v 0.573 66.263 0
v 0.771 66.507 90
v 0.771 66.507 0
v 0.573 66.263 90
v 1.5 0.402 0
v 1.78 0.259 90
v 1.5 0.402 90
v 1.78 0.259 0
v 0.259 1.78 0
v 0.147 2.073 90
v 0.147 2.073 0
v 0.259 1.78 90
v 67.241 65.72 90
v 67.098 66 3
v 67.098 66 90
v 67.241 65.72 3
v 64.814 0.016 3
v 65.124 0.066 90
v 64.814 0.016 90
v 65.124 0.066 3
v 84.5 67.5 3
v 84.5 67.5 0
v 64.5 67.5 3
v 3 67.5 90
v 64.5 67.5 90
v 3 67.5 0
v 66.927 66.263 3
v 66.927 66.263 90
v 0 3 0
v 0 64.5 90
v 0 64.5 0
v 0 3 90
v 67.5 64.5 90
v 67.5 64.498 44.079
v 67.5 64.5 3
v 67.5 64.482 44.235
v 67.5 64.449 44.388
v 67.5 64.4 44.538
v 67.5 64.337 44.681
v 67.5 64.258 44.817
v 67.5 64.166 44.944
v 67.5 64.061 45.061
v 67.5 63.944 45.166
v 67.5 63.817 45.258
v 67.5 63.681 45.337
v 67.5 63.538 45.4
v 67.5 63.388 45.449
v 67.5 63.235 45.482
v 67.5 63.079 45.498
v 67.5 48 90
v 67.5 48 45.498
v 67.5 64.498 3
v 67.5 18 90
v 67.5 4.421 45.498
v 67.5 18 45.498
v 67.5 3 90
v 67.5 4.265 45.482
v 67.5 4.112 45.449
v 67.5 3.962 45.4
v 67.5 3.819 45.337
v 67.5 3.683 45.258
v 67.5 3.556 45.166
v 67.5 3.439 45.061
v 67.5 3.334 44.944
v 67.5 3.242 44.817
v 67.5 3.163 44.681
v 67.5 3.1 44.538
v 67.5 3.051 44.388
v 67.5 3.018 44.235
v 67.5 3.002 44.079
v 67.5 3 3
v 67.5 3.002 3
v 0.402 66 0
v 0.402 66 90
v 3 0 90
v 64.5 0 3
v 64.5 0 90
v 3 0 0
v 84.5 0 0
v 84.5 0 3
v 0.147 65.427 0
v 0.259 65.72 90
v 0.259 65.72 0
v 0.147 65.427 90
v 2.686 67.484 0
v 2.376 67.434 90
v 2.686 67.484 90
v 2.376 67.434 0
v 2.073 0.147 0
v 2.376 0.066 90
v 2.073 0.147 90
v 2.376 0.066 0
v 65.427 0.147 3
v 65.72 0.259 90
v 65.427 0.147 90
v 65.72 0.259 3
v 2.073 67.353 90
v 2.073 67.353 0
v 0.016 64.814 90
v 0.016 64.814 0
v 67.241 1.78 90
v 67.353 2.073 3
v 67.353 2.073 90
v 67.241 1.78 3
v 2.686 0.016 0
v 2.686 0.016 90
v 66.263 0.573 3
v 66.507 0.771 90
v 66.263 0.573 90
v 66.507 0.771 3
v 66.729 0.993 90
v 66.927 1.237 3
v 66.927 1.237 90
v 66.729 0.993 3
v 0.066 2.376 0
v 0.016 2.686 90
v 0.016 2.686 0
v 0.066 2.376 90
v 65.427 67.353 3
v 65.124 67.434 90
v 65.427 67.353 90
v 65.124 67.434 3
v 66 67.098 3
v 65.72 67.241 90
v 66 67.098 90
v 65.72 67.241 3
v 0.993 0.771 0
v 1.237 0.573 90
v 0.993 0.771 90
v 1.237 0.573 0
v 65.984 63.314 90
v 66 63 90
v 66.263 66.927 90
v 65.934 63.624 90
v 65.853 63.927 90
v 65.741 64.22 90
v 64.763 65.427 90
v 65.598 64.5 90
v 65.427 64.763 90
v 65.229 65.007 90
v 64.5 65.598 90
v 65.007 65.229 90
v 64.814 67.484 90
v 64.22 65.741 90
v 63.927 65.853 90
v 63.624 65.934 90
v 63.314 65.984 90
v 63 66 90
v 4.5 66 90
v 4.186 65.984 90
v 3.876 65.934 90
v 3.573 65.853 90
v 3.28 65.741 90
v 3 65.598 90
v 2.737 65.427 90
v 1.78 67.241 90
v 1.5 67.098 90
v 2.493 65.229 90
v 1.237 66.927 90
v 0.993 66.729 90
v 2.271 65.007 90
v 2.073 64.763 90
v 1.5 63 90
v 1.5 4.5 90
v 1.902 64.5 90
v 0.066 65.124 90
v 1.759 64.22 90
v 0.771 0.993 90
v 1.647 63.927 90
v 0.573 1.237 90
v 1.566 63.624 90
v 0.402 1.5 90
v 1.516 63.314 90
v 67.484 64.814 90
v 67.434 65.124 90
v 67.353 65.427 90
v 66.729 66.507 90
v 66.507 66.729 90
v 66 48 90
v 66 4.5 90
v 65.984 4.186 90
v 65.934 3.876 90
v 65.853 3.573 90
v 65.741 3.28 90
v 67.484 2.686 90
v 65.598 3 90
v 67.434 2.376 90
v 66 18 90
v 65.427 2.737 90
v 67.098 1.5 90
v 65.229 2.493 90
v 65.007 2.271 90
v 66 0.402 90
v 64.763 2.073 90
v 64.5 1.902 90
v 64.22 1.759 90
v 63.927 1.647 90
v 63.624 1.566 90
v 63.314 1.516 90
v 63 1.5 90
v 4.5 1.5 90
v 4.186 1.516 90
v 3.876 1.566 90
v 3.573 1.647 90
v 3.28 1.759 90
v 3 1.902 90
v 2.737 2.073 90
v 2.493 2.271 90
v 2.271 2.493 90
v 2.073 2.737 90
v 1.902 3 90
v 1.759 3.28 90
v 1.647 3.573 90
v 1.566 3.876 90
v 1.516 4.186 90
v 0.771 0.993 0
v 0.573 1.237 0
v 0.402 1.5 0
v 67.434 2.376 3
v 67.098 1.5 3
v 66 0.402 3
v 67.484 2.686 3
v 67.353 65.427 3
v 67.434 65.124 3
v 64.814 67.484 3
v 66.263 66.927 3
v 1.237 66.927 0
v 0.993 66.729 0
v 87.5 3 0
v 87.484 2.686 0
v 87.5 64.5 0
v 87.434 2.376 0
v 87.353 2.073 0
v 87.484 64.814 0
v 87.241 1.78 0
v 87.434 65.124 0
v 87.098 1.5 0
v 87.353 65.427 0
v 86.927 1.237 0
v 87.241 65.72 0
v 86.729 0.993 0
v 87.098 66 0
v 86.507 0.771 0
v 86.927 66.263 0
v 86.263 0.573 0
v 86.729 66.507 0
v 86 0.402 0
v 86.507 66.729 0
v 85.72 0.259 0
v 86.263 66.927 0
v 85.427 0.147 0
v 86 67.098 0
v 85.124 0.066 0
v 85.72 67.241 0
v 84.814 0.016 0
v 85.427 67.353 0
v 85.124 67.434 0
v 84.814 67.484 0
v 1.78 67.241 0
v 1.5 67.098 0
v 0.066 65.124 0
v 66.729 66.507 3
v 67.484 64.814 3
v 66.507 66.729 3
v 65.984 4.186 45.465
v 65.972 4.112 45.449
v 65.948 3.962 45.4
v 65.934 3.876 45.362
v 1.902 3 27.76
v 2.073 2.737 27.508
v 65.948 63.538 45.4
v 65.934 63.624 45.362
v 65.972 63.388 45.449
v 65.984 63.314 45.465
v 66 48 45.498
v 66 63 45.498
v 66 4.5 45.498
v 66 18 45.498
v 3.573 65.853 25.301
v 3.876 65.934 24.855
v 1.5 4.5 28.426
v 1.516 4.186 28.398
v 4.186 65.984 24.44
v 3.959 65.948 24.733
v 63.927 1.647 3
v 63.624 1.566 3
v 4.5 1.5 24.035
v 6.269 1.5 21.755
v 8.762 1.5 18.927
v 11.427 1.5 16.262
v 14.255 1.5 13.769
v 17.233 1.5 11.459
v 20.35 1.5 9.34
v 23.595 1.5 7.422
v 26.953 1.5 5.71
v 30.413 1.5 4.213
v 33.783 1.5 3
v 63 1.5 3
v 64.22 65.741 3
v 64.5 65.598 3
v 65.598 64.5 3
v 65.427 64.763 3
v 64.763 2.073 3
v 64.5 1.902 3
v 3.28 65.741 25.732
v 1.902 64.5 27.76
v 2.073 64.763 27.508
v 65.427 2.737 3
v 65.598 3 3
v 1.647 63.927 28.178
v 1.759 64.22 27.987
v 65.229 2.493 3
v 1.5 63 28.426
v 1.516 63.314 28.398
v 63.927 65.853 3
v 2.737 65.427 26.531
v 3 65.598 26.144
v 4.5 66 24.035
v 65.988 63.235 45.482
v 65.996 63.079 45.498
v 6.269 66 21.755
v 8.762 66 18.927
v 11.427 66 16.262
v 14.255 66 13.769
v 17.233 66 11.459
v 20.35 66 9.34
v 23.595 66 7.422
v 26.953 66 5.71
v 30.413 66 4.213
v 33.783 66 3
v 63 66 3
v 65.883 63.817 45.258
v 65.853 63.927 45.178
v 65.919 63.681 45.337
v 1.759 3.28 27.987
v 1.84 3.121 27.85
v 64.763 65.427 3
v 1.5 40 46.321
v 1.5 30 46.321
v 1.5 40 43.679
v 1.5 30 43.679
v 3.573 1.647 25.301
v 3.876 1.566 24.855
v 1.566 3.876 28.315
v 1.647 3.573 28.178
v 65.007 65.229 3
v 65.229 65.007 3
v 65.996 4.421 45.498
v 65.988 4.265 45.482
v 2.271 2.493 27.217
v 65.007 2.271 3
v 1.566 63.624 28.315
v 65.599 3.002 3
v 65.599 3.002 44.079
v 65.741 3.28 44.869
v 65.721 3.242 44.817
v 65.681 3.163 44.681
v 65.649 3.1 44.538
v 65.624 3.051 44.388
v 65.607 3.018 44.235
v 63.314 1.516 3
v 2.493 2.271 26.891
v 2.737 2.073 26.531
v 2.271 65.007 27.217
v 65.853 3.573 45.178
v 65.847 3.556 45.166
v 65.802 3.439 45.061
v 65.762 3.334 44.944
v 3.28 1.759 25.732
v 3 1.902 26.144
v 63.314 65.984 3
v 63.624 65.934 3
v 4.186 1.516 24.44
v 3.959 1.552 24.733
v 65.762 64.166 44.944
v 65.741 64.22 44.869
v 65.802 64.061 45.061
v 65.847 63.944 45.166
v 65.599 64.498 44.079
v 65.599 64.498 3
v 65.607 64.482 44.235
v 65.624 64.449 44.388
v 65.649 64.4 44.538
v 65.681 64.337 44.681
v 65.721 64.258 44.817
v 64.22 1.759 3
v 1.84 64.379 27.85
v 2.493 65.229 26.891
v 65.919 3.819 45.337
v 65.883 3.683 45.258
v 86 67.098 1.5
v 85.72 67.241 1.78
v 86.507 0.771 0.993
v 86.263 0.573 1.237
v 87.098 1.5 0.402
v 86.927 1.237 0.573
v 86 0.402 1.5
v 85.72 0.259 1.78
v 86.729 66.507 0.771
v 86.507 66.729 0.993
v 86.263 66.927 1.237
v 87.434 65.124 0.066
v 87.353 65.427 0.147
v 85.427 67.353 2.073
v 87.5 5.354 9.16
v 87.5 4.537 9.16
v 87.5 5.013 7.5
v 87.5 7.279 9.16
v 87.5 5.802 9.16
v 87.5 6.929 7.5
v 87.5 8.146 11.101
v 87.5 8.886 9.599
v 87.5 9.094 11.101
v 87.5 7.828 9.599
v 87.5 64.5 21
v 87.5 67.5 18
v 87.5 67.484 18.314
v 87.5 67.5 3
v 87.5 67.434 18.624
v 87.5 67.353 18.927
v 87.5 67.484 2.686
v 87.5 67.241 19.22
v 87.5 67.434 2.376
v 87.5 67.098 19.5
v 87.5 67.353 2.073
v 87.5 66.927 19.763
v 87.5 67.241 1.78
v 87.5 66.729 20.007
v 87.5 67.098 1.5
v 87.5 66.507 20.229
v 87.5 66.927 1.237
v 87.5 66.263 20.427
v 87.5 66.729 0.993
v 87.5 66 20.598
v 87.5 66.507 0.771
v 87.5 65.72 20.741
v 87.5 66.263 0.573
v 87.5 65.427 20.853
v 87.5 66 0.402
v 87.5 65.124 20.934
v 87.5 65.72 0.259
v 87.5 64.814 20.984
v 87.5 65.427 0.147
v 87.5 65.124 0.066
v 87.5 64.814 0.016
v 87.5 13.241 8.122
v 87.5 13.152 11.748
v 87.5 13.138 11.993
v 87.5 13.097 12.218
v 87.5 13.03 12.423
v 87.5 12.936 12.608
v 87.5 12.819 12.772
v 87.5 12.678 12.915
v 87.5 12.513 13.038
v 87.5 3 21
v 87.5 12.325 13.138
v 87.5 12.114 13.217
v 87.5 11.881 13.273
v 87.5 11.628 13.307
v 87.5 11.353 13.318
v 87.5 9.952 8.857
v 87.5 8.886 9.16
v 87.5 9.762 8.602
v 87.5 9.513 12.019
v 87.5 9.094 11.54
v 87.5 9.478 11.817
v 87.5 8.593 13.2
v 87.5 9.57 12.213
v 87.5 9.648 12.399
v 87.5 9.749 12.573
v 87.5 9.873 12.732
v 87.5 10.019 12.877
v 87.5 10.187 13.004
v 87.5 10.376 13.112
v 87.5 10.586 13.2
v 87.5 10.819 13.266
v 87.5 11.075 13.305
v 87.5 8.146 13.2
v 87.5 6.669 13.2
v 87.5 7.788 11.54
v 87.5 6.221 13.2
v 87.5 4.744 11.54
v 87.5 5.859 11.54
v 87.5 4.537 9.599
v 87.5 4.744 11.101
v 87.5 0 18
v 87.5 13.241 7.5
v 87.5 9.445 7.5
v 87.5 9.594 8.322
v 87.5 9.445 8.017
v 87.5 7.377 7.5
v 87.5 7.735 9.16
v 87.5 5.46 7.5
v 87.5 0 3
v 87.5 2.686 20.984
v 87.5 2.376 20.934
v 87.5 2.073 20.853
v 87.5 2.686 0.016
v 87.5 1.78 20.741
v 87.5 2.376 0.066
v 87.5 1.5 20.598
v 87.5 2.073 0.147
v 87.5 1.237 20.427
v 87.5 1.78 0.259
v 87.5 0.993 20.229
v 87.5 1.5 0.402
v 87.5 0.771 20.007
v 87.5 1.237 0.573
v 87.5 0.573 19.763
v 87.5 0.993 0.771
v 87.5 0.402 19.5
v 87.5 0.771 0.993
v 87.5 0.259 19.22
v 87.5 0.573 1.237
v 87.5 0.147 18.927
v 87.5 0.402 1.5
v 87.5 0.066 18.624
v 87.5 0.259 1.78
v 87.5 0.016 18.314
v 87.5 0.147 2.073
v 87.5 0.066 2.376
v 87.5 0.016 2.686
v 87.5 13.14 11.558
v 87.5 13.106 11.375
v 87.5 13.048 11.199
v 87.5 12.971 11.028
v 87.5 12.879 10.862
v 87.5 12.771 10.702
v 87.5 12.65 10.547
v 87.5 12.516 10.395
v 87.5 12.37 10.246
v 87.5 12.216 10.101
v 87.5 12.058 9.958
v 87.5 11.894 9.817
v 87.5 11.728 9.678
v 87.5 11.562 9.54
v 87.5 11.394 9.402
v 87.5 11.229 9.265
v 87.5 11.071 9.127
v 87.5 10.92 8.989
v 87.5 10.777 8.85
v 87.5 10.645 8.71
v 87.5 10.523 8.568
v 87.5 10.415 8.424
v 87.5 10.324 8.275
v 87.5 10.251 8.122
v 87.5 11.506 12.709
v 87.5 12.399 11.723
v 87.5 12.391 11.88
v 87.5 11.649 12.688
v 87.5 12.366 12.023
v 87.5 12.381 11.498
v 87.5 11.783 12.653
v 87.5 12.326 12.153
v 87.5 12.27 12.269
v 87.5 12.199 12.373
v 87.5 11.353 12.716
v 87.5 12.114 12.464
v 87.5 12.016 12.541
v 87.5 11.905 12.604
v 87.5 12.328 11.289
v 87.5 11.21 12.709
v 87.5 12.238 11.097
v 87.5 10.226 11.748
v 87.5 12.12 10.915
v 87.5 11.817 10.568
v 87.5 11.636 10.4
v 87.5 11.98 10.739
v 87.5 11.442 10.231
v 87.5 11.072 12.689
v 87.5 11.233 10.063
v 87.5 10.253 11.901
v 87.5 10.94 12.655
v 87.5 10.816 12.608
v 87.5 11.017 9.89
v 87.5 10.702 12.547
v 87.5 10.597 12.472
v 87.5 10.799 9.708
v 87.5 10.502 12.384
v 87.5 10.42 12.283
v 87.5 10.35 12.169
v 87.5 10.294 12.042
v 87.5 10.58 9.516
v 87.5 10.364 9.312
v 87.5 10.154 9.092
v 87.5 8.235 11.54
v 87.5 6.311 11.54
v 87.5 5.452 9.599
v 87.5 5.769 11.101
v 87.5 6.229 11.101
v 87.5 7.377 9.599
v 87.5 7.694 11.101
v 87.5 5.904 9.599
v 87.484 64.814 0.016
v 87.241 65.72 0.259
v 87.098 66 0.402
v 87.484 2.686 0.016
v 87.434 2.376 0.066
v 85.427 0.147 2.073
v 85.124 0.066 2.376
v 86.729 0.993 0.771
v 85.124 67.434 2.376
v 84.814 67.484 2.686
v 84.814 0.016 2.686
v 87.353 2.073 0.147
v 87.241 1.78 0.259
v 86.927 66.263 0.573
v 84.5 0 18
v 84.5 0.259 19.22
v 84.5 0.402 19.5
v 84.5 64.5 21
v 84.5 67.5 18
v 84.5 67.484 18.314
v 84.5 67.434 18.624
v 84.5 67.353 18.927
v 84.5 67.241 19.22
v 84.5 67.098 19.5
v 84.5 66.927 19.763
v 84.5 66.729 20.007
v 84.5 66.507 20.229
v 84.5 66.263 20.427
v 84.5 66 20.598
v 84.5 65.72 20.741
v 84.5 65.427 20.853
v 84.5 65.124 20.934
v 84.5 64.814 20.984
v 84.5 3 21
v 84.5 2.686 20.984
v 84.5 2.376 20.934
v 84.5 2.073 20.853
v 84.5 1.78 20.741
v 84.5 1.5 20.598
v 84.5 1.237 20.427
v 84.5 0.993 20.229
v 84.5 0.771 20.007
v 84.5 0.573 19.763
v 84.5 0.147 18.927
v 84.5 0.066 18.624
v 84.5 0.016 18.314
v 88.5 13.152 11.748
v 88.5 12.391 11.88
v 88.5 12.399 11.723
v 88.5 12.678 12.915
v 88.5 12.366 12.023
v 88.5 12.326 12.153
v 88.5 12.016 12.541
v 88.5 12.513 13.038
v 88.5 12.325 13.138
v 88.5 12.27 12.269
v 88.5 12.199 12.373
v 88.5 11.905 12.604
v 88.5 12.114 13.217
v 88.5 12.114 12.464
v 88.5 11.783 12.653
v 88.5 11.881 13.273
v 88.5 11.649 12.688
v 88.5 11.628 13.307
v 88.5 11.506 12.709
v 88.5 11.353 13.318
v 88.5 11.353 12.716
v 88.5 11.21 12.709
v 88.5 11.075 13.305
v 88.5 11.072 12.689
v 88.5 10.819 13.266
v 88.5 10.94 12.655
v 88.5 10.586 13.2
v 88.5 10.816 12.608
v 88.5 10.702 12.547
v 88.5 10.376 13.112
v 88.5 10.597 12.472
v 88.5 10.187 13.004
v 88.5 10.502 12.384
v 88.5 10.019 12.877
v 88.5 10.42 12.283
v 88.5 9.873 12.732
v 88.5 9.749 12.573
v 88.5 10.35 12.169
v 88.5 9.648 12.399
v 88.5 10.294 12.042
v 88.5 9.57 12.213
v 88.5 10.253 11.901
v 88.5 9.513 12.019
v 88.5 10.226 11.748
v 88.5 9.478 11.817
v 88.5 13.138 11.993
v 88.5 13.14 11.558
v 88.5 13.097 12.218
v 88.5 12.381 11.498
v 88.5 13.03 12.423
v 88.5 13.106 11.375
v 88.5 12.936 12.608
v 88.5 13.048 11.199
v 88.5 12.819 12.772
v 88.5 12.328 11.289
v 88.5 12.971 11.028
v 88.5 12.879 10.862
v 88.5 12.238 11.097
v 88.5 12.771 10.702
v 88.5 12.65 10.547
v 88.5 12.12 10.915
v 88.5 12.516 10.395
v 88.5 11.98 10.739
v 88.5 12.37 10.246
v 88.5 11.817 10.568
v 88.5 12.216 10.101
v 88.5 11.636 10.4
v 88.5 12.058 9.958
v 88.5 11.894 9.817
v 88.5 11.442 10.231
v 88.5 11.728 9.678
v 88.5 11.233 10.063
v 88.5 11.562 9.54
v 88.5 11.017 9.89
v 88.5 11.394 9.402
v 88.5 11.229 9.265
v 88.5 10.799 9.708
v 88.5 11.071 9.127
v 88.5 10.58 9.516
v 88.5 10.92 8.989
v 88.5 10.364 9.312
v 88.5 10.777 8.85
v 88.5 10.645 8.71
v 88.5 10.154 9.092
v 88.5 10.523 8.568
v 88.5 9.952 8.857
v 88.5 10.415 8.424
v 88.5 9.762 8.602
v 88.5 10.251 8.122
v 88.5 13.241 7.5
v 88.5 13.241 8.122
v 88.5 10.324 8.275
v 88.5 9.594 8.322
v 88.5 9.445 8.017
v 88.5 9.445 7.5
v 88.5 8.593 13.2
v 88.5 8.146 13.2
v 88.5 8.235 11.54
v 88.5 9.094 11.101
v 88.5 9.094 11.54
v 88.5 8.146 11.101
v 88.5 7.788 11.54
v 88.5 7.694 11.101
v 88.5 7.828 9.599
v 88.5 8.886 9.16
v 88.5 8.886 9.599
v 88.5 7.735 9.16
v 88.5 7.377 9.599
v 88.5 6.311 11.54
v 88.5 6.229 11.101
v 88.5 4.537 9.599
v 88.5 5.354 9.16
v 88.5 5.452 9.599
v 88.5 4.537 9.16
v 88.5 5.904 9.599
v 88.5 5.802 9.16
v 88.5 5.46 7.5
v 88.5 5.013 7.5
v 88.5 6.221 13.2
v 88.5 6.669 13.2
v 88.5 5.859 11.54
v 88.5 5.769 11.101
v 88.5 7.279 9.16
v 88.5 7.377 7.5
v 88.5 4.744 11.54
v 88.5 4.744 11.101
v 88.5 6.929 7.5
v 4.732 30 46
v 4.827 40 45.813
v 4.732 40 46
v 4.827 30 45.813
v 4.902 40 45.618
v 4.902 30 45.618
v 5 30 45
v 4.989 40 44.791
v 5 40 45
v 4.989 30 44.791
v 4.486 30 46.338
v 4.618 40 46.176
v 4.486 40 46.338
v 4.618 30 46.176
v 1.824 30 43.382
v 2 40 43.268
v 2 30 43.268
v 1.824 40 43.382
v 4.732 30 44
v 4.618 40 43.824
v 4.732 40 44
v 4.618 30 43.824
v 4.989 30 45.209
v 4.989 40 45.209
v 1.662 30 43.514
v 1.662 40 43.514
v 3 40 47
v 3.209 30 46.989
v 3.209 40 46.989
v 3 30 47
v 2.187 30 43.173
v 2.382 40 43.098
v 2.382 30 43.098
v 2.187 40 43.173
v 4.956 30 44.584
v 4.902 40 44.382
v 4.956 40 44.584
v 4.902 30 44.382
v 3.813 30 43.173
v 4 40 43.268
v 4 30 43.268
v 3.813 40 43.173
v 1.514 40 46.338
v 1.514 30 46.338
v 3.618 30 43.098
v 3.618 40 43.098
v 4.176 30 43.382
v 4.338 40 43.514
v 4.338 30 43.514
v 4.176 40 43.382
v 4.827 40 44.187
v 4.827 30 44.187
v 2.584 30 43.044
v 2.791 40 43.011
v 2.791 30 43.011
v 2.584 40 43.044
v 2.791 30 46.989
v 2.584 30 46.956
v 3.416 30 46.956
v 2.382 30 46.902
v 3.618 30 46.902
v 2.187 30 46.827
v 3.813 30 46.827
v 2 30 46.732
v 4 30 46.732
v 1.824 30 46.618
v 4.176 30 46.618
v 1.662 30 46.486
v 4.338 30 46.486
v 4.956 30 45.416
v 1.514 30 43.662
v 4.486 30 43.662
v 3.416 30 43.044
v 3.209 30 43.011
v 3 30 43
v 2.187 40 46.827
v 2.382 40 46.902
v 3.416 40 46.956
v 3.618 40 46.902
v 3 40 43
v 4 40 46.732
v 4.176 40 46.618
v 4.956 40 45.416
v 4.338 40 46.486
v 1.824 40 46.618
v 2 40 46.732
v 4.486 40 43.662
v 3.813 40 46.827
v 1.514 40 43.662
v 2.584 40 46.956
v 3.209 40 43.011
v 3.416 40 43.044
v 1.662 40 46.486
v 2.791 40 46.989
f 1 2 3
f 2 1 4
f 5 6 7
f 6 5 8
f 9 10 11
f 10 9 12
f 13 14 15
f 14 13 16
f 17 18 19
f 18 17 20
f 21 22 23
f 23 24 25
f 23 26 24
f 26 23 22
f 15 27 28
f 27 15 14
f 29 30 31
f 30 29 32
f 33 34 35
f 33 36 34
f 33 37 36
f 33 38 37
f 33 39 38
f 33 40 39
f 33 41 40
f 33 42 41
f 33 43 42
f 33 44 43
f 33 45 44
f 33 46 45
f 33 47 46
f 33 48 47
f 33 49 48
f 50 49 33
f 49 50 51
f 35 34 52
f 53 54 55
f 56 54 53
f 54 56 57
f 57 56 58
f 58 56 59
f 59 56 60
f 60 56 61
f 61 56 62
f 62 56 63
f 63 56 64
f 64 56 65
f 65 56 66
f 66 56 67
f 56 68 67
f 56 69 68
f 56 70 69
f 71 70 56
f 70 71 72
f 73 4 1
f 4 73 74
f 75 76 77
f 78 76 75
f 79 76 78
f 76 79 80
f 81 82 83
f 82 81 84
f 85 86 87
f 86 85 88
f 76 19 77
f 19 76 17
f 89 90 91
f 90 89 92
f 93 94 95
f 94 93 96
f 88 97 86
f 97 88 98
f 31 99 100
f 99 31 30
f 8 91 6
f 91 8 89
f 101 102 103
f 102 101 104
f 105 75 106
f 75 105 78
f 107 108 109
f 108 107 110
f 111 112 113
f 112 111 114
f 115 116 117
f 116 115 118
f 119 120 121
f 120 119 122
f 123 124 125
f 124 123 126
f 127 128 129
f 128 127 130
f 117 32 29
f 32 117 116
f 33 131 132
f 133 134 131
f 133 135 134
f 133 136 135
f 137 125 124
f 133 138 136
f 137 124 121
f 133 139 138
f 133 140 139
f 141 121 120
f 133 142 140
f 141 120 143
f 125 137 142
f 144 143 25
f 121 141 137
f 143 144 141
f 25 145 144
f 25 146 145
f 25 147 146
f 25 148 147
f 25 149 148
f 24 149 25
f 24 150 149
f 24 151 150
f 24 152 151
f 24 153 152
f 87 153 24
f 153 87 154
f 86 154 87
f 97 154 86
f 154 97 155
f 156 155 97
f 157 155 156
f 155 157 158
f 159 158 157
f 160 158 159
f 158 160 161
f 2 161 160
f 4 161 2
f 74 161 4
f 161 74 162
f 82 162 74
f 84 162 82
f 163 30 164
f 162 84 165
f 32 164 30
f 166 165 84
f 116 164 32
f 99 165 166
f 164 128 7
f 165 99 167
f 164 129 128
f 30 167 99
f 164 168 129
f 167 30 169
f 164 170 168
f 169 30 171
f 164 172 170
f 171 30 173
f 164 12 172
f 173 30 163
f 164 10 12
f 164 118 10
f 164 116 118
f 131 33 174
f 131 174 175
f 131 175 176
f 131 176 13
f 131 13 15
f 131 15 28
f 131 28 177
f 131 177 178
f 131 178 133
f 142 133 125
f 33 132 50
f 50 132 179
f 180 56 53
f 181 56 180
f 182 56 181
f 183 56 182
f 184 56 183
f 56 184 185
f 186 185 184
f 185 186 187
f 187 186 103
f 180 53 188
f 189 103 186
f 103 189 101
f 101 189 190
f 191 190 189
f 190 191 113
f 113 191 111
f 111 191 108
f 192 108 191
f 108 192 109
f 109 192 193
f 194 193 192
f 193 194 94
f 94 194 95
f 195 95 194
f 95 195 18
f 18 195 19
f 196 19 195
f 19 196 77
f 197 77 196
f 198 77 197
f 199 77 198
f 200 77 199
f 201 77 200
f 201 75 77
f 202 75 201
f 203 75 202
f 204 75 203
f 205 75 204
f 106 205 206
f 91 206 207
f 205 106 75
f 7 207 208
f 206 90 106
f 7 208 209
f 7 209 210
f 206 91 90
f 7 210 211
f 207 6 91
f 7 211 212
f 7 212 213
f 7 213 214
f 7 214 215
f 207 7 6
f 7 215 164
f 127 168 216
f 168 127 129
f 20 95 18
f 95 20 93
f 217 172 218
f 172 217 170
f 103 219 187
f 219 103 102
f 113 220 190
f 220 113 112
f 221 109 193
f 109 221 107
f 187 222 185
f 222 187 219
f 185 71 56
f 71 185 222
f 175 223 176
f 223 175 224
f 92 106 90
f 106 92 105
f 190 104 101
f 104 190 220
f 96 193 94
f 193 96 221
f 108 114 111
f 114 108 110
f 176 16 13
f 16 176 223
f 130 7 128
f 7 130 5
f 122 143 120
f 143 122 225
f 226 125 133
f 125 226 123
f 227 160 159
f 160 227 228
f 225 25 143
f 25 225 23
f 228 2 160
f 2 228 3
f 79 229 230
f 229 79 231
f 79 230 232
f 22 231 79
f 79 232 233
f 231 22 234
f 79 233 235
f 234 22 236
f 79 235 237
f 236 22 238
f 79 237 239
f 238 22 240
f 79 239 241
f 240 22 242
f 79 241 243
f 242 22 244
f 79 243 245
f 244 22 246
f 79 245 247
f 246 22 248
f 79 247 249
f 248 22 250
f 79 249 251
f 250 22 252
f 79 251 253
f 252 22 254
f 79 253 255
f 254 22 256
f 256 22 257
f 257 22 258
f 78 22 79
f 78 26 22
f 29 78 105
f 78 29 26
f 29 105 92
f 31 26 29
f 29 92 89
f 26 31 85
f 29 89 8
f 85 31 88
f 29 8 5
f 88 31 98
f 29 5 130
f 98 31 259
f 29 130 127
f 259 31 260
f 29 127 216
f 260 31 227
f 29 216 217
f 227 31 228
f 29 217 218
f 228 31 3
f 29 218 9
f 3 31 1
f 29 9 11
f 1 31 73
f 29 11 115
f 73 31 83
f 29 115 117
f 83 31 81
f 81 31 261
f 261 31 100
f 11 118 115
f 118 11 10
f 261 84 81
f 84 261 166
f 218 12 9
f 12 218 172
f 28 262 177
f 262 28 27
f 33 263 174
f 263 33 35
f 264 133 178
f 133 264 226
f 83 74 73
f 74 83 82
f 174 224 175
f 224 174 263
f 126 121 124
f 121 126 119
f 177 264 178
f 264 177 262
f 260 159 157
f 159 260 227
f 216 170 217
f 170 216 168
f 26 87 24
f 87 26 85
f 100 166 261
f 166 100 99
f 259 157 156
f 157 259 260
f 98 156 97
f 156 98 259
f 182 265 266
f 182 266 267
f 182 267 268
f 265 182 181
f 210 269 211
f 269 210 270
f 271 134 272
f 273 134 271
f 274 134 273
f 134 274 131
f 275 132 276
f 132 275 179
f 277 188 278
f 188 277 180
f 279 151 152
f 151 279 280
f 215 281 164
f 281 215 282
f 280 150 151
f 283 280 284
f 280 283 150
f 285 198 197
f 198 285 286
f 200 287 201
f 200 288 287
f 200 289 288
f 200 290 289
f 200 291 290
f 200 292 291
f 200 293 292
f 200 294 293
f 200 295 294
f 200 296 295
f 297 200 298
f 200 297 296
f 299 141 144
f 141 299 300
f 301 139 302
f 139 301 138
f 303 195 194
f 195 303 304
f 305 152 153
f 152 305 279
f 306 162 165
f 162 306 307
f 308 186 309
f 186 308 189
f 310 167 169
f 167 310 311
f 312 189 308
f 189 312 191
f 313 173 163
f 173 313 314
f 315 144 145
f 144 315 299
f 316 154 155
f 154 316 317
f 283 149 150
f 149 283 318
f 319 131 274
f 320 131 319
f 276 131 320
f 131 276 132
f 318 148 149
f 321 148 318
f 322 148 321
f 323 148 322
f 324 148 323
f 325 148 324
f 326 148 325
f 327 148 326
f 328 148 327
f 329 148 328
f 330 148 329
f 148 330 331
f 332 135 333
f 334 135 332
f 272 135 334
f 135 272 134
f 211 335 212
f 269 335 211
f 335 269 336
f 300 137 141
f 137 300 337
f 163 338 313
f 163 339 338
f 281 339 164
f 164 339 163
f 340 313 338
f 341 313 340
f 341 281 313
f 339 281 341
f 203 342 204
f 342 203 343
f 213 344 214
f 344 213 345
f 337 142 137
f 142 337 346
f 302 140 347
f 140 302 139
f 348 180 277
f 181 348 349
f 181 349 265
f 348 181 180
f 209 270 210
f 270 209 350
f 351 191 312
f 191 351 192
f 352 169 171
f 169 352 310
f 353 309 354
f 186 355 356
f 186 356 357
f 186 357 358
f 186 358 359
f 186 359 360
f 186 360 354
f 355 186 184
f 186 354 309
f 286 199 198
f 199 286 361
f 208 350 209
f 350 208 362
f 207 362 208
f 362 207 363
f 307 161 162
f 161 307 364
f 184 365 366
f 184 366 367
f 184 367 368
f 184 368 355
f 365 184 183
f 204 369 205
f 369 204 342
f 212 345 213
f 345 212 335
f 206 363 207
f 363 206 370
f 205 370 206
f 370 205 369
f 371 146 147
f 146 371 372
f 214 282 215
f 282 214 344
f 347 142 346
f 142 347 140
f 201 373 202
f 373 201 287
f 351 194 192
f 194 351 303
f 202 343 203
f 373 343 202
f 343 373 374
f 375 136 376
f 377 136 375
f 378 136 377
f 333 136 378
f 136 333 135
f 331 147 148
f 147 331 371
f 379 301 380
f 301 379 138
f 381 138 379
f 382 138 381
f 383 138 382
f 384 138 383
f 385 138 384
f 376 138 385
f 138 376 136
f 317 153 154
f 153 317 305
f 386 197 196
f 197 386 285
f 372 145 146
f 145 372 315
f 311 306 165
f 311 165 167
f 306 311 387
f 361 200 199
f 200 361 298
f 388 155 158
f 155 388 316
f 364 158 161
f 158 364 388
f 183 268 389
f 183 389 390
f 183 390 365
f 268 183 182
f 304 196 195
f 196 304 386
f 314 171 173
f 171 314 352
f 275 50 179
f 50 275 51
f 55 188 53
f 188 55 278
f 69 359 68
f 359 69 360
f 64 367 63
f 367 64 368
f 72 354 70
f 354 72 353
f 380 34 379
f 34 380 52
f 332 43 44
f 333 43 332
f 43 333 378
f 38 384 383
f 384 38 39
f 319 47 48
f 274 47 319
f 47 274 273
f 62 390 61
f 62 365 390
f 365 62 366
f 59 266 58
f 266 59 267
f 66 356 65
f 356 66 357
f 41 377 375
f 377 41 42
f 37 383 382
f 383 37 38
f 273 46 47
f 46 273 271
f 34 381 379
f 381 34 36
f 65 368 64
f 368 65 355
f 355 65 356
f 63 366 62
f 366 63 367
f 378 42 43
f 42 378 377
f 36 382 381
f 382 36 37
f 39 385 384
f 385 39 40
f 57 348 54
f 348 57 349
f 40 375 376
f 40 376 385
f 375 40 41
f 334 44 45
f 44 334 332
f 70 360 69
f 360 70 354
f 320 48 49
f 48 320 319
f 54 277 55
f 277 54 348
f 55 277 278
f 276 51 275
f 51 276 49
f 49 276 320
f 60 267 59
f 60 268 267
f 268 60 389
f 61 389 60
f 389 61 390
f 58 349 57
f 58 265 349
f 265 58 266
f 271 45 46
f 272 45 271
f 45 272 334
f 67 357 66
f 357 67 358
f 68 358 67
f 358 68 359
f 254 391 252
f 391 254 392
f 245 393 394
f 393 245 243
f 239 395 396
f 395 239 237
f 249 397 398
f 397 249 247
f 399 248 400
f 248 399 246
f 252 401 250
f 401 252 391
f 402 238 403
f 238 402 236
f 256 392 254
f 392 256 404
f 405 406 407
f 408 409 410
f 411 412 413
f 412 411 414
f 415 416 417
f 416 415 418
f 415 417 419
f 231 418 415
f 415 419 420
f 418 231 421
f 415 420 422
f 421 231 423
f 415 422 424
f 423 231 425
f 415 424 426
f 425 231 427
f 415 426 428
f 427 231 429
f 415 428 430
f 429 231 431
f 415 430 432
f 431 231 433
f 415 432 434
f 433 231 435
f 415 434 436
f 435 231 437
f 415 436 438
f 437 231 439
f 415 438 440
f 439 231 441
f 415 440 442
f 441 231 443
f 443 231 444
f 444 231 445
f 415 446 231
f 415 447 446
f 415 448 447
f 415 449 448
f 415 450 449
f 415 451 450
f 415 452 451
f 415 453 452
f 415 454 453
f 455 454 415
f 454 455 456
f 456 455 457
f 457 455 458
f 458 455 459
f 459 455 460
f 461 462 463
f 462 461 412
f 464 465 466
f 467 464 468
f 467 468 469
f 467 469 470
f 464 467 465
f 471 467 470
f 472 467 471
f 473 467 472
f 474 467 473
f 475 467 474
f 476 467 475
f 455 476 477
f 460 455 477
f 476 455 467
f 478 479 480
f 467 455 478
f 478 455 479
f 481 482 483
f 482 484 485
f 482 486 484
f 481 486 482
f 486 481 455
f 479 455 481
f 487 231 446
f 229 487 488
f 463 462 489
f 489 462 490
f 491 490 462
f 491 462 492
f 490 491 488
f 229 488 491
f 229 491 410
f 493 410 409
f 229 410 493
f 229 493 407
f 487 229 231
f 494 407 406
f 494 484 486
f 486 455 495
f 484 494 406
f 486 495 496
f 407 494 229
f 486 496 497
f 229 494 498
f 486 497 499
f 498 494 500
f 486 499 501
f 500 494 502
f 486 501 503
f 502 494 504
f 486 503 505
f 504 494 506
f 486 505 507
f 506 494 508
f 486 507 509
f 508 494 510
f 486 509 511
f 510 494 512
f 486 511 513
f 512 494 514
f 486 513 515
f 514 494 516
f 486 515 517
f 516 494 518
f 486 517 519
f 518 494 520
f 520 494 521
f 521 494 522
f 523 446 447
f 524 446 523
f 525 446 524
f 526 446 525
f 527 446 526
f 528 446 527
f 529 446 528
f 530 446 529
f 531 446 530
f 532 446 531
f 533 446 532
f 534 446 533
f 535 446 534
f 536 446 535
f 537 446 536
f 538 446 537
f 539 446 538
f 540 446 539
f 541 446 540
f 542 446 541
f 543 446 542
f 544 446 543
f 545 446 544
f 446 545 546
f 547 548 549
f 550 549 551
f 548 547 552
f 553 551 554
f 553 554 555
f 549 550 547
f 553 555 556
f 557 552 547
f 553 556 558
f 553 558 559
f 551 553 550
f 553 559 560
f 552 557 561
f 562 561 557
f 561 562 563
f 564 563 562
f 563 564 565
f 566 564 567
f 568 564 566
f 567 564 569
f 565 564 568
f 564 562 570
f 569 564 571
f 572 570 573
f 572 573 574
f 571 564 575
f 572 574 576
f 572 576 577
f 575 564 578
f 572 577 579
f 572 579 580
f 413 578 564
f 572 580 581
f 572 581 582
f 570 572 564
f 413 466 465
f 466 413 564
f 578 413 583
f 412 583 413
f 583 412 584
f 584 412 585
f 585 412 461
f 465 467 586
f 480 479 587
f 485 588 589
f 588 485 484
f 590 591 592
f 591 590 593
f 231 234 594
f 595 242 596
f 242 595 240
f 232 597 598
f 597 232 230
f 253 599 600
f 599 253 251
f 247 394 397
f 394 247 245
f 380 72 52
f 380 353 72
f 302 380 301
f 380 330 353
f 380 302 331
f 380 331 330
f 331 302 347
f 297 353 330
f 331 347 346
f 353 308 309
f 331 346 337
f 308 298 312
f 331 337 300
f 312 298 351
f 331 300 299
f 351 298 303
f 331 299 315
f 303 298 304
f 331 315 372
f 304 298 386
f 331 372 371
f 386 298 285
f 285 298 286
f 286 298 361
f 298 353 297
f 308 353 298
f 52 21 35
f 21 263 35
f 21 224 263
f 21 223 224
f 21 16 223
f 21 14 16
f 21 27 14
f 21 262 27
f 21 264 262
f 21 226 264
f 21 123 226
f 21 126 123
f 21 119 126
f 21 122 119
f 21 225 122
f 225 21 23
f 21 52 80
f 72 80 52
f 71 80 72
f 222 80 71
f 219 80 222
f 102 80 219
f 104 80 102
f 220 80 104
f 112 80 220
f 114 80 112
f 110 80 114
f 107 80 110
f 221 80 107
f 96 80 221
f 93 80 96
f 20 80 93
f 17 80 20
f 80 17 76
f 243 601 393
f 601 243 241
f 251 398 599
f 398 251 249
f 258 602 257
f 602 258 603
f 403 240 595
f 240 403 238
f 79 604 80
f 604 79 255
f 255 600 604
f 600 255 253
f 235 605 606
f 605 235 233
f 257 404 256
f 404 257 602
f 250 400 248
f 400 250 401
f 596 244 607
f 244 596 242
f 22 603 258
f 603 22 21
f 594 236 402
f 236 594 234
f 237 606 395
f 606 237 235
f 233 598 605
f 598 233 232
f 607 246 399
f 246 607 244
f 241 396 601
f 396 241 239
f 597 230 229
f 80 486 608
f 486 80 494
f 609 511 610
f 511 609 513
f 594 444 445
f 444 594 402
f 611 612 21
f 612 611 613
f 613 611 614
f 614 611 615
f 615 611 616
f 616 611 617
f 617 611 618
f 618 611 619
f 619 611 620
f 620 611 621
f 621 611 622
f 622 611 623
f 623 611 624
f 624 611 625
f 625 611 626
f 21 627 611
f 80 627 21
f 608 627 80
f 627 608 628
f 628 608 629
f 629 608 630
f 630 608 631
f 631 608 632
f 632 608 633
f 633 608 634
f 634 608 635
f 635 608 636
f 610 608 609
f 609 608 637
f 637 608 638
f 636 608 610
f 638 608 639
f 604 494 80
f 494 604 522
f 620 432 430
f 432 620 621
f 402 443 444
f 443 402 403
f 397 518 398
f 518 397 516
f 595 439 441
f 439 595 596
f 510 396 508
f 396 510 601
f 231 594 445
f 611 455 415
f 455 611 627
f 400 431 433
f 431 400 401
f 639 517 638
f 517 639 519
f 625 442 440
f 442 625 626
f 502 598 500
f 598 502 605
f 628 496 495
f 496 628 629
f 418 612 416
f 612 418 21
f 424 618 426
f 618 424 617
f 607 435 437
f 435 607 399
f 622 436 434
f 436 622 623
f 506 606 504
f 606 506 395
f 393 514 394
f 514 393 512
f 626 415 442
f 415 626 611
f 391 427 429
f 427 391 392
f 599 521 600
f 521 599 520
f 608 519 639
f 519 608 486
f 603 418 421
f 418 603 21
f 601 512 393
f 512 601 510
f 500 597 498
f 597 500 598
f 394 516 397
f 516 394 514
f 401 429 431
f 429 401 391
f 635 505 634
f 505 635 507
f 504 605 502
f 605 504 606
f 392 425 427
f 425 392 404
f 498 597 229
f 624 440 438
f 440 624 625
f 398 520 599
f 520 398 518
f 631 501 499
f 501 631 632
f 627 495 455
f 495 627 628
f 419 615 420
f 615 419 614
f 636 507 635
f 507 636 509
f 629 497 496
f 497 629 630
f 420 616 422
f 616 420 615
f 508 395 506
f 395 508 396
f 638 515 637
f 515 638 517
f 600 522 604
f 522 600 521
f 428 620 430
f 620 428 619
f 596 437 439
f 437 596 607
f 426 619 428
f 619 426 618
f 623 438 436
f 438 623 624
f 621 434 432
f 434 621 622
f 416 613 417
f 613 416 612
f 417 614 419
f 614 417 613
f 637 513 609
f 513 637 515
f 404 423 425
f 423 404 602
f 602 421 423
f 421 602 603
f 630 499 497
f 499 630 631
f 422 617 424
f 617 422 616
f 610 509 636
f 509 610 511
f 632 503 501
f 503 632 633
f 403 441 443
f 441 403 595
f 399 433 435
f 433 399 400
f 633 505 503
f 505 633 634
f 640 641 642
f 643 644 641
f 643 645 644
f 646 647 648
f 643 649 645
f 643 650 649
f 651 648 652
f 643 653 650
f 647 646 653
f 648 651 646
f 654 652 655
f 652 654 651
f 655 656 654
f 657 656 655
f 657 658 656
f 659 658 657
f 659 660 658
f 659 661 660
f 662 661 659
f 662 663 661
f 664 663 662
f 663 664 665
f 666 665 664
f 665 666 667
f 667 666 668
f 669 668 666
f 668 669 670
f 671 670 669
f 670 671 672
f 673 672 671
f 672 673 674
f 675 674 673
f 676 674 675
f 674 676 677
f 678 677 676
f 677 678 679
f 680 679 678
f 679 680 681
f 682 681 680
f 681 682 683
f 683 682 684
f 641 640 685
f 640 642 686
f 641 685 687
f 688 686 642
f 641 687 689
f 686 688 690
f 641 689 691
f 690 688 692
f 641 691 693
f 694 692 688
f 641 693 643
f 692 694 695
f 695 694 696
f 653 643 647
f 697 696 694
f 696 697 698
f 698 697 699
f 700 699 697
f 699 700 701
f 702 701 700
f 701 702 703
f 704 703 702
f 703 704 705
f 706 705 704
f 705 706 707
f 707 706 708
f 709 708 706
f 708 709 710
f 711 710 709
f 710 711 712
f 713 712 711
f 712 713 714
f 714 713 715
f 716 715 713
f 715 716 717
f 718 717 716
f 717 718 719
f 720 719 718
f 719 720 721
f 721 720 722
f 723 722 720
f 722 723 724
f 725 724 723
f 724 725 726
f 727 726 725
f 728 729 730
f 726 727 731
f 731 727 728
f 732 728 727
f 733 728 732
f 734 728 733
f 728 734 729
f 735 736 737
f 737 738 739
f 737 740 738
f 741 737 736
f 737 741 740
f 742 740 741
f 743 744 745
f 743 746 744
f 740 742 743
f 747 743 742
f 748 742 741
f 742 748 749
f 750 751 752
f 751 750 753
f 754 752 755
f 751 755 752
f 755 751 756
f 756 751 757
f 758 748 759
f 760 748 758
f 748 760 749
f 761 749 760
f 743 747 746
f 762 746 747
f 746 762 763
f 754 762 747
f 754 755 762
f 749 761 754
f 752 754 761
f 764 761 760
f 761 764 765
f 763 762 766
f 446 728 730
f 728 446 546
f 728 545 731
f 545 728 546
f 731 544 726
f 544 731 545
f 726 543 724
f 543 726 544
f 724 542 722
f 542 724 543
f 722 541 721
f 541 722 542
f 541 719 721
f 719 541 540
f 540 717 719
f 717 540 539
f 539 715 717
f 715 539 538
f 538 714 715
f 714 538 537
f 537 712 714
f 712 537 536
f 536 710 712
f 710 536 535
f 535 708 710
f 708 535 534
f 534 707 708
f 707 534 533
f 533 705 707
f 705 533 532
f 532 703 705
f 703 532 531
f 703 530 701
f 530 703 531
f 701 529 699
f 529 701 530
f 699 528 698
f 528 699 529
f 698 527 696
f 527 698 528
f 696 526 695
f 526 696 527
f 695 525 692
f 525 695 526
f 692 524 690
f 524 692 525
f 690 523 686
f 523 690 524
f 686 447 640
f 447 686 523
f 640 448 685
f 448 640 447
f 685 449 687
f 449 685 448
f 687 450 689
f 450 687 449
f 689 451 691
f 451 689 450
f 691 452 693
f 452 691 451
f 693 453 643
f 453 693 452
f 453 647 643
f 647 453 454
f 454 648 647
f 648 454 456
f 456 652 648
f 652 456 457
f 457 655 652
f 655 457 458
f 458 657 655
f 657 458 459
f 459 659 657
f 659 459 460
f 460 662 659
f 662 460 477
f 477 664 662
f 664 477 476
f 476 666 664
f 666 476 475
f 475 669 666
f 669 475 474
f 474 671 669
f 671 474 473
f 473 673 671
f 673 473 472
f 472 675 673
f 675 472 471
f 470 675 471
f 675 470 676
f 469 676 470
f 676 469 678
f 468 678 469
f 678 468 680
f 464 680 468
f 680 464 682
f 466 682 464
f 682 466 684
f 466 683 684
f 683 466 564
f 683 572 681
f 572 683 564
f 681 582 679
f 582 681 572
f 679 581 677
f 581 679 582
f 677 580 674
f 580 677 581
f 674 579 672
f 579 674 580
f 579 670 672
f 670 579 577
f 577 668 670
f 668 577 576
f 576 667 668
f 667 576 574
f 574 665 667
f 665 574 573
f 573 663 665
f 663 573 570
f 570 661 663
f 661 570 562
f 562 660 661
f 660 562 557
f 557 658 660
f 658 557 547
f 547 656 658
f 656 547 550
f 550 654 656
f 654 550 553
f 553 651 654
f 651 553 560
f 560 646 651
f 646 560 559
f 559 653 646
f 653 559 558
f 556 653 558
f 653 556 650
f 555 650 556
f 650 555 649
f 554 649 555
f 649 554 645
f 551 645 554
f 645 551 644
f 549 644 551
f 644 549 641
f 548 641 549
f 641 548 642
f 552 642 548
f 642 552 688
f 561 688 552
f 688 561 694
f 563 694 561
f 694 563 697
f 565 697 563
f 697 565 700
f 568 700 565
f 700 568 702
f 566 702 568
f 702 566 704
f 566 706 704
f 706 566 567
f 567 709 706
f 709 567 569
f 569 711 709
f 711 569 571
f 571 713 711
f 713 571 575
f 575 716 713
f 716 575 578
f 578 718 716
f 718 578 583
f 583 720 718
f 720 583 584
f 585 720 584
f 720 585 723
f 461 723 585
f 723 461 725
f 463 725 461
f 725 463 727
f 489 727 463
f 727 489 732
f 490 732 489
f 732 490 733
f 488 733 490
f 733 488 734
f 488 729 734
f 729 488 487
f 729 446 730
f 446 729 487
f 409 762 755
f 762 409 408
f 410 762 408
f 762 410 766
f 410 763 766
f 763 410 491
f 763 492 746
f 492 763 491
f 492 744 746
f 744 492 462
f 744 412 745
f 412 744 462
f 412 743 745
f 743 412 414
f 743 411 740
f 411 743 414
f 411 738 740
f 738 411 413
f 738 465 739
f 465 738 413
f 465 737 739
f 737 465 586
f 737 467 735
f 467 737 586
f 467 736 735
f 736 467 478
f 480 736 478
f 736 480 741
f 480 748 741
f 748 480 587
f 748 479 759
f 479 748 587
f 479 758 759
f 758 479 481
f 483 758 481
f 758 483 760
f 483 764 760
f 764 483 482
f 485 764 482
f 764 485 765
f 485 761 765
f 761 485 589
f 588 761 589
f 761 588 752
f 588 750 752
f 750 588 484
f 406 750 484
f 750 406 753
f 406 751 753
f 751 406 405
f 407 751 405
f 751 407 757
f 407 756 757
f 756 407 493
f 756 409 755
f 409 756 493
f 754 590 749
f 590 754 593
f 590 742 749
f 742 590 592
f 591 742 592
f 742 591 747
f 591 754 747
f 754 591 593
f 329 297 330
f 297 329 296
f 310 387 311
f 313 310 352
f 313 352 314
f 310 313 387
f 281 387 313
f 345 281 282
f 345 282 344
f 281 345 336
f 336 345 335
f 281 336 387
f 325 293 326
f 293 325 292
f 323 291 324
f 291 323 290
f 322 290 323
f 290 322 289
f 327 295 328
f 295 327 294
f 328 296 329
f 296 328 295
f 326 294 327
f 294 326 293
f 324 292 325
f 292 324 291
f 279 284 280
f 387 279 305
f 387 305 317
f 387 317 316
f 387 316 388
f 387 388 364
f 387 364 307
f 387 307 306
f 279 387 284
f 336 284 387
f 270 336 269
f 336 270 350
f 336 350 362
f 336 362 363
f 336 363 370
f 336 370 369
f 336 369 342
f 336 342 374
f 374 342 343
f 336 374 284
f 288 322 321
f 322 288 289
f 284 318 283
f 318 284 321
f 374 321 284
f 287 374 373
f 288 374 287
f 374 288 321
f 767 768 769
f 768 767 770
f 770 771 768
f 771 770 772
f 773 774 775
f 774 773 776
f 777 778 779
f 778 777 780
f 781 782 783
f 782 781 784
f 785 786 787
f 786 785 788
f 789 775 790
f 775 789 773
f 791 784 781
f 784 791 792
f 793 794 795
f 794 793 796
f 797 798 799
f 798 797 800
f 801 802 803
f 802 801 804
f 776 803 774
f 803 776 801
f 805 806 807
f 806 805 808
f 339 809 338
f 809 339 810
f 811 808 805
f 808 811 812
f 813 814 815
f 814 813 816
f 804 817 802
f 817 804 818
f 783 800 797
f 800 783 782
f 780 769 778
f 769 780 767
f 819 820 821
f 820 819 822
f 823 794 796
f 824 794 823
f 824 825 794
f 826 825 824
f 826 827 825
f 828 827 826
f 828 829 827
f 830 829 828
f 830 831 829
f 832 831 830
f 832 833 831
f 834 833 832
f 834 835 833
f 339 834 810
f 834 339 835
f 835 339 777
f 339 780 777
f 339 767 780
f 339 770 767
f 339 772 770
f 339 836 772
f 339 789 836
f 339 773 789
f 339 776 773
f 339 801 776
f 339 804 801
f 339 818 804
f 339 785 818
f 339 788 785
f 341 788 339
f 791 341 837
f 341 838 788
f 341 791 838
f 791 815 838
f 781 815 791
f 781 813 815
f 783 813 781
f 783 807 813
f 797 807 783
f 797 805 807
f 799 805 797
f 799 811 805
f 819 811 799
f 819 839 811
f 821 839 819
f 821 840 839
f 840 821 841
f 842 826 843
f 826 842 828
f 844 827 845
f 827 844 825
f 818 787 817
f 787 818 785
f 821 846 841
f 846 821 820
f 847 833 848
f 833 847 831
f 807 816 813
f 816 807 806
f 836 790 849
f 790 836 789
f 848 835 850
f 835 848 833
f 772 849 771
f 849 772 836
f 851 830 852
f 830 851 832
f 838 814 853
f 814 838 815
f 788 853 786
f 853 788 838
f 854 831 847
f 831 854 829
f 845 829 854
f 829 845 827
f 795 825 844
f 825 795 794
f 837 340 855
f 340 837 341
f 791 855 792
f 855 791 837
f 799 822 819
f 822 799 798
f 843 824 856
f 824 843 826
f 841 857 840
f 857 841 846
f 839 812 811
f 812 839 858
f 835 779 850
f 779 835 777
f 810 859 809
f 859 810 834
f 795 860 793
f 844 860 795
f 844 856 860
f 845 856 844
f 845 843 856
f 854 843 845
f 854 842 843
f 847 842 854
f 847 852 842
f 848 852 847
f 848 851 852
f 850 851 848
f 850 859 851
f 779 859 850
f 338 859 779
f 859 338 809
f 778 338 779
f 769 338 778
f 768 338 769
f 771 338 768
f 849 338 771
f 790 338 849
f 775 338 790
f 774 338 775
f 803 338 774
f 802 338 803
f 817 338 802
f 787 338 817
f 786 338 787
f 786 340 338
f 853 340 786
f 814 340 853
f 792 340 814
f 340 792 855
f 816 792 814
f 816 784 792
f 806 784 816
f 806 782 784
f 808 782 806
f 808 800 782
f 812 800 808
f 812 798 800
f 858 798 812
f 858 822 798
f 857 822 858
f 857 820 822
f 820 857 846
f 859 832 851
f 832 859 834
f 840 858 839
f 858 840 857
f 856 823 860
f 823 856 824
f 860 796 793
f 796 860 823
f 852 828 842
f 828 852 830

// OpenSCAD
module box_sleeve(width, depth, height, thickness, radius) {
  translate([radius, radius, 0]) {
    difference() {
      hull() {
	for (p = [[0, 0, 0],
		  [width + thickness / 2, 0, 0],
		  [0, depth + thickness / 2, 0],
		  [width + thickness / 2, depth + thickness / 2, 0]]) {
	  translate(p) {
	    cylinder(h = height, r = radius, $fn=60);
	  }
	}
      }

      hull() {
	for (p = [[thickness/2, thickness/2, -10],
		  [width, thickness/2, -10],
		  [thickness/2, depth, -10],
		  [width, depth, -10]]) {
	  translate(p) {
	    cylinder(h = height * 1.5, r = radius, $fn=60);
	  }
	}
      }

      translate([3 * width / 4, depth / 4, -10]) {
        cube([width / 2, depth / 2, height * 1.5]);
      }

      translate([3 * width / 4, thickness / 2, -1]) {
	minkowski() {
          cube([width - thickness / 2, depth - thickness/2, height / 2]);
	  sphere(thickness / 2, $fn = 60);
        }
      }
    }
  }
}

module shelf(width, depth, height) {
  translate([height, height, 0])
  hull() {
    for (p = [[0, 0, 0],
	      [width + height / 2, 0, 0],
	      [0, depth + height / 2, 0],
	      [width + height / 2, depth + height / 2, 0]]) {
      translate(p) {
	cylinder(h = height, r = height, $fn=60);
      }
    }
  }

  translate([width + height * 1.5, height, 15 + height])
  rotate([0, 90, 0])
  hull() {
    for (p = [[0, 0, 0],
	      [15, 0, 0],
	      [0, depth + height / 2, 0],
	      [15, depth + height / 2, 0]]) {
      translate(p) {
	cylinder(h = height, r = height, $fn=60);
      }
    }
  }

  translate([width + height * 1.5, height * 1.5, 7.5]) {
    rotate(a = [-270, 0, 90])
    linear_extrude(4)
    text("#2", size=6);
  }
}

module lip(box_depth, box_height) {
  translate([3, box_depth / 2, box_height / 2])
  rotate([-90, 0, 0])
  cylinder(h = 10, r = 2, $fn = 60);
}

module ramp(width, depth, height, thickness, radius) {
  difference() {
    translate([radius, radius, 0]) {
      hull() {
	for (p = [[thickness/2, thickness/2, 0],
		  [width, thickness/2, 0],
		  [thickness/2, depth, 0],
		  [width, depth, 0]]) {
	  translate(p) {
	    cylinder(h = height, r = radius, $fn=60);
	  }
	}
      }
    }

    translate([height*1.75, 0, height*2])
      rotate([-90, 0, 0])
      cylinder(h = width + thickness*2, r = height*2, $fn = 100);
  }
}

module coffee_holder() {
  box_sleeve(60, 60, 90, 3, 3);
  shelf(80, 60, 3);
  lip(60, 90);
  ramp(60, 60, 30, 3, 3);
}

coffee_holder();
